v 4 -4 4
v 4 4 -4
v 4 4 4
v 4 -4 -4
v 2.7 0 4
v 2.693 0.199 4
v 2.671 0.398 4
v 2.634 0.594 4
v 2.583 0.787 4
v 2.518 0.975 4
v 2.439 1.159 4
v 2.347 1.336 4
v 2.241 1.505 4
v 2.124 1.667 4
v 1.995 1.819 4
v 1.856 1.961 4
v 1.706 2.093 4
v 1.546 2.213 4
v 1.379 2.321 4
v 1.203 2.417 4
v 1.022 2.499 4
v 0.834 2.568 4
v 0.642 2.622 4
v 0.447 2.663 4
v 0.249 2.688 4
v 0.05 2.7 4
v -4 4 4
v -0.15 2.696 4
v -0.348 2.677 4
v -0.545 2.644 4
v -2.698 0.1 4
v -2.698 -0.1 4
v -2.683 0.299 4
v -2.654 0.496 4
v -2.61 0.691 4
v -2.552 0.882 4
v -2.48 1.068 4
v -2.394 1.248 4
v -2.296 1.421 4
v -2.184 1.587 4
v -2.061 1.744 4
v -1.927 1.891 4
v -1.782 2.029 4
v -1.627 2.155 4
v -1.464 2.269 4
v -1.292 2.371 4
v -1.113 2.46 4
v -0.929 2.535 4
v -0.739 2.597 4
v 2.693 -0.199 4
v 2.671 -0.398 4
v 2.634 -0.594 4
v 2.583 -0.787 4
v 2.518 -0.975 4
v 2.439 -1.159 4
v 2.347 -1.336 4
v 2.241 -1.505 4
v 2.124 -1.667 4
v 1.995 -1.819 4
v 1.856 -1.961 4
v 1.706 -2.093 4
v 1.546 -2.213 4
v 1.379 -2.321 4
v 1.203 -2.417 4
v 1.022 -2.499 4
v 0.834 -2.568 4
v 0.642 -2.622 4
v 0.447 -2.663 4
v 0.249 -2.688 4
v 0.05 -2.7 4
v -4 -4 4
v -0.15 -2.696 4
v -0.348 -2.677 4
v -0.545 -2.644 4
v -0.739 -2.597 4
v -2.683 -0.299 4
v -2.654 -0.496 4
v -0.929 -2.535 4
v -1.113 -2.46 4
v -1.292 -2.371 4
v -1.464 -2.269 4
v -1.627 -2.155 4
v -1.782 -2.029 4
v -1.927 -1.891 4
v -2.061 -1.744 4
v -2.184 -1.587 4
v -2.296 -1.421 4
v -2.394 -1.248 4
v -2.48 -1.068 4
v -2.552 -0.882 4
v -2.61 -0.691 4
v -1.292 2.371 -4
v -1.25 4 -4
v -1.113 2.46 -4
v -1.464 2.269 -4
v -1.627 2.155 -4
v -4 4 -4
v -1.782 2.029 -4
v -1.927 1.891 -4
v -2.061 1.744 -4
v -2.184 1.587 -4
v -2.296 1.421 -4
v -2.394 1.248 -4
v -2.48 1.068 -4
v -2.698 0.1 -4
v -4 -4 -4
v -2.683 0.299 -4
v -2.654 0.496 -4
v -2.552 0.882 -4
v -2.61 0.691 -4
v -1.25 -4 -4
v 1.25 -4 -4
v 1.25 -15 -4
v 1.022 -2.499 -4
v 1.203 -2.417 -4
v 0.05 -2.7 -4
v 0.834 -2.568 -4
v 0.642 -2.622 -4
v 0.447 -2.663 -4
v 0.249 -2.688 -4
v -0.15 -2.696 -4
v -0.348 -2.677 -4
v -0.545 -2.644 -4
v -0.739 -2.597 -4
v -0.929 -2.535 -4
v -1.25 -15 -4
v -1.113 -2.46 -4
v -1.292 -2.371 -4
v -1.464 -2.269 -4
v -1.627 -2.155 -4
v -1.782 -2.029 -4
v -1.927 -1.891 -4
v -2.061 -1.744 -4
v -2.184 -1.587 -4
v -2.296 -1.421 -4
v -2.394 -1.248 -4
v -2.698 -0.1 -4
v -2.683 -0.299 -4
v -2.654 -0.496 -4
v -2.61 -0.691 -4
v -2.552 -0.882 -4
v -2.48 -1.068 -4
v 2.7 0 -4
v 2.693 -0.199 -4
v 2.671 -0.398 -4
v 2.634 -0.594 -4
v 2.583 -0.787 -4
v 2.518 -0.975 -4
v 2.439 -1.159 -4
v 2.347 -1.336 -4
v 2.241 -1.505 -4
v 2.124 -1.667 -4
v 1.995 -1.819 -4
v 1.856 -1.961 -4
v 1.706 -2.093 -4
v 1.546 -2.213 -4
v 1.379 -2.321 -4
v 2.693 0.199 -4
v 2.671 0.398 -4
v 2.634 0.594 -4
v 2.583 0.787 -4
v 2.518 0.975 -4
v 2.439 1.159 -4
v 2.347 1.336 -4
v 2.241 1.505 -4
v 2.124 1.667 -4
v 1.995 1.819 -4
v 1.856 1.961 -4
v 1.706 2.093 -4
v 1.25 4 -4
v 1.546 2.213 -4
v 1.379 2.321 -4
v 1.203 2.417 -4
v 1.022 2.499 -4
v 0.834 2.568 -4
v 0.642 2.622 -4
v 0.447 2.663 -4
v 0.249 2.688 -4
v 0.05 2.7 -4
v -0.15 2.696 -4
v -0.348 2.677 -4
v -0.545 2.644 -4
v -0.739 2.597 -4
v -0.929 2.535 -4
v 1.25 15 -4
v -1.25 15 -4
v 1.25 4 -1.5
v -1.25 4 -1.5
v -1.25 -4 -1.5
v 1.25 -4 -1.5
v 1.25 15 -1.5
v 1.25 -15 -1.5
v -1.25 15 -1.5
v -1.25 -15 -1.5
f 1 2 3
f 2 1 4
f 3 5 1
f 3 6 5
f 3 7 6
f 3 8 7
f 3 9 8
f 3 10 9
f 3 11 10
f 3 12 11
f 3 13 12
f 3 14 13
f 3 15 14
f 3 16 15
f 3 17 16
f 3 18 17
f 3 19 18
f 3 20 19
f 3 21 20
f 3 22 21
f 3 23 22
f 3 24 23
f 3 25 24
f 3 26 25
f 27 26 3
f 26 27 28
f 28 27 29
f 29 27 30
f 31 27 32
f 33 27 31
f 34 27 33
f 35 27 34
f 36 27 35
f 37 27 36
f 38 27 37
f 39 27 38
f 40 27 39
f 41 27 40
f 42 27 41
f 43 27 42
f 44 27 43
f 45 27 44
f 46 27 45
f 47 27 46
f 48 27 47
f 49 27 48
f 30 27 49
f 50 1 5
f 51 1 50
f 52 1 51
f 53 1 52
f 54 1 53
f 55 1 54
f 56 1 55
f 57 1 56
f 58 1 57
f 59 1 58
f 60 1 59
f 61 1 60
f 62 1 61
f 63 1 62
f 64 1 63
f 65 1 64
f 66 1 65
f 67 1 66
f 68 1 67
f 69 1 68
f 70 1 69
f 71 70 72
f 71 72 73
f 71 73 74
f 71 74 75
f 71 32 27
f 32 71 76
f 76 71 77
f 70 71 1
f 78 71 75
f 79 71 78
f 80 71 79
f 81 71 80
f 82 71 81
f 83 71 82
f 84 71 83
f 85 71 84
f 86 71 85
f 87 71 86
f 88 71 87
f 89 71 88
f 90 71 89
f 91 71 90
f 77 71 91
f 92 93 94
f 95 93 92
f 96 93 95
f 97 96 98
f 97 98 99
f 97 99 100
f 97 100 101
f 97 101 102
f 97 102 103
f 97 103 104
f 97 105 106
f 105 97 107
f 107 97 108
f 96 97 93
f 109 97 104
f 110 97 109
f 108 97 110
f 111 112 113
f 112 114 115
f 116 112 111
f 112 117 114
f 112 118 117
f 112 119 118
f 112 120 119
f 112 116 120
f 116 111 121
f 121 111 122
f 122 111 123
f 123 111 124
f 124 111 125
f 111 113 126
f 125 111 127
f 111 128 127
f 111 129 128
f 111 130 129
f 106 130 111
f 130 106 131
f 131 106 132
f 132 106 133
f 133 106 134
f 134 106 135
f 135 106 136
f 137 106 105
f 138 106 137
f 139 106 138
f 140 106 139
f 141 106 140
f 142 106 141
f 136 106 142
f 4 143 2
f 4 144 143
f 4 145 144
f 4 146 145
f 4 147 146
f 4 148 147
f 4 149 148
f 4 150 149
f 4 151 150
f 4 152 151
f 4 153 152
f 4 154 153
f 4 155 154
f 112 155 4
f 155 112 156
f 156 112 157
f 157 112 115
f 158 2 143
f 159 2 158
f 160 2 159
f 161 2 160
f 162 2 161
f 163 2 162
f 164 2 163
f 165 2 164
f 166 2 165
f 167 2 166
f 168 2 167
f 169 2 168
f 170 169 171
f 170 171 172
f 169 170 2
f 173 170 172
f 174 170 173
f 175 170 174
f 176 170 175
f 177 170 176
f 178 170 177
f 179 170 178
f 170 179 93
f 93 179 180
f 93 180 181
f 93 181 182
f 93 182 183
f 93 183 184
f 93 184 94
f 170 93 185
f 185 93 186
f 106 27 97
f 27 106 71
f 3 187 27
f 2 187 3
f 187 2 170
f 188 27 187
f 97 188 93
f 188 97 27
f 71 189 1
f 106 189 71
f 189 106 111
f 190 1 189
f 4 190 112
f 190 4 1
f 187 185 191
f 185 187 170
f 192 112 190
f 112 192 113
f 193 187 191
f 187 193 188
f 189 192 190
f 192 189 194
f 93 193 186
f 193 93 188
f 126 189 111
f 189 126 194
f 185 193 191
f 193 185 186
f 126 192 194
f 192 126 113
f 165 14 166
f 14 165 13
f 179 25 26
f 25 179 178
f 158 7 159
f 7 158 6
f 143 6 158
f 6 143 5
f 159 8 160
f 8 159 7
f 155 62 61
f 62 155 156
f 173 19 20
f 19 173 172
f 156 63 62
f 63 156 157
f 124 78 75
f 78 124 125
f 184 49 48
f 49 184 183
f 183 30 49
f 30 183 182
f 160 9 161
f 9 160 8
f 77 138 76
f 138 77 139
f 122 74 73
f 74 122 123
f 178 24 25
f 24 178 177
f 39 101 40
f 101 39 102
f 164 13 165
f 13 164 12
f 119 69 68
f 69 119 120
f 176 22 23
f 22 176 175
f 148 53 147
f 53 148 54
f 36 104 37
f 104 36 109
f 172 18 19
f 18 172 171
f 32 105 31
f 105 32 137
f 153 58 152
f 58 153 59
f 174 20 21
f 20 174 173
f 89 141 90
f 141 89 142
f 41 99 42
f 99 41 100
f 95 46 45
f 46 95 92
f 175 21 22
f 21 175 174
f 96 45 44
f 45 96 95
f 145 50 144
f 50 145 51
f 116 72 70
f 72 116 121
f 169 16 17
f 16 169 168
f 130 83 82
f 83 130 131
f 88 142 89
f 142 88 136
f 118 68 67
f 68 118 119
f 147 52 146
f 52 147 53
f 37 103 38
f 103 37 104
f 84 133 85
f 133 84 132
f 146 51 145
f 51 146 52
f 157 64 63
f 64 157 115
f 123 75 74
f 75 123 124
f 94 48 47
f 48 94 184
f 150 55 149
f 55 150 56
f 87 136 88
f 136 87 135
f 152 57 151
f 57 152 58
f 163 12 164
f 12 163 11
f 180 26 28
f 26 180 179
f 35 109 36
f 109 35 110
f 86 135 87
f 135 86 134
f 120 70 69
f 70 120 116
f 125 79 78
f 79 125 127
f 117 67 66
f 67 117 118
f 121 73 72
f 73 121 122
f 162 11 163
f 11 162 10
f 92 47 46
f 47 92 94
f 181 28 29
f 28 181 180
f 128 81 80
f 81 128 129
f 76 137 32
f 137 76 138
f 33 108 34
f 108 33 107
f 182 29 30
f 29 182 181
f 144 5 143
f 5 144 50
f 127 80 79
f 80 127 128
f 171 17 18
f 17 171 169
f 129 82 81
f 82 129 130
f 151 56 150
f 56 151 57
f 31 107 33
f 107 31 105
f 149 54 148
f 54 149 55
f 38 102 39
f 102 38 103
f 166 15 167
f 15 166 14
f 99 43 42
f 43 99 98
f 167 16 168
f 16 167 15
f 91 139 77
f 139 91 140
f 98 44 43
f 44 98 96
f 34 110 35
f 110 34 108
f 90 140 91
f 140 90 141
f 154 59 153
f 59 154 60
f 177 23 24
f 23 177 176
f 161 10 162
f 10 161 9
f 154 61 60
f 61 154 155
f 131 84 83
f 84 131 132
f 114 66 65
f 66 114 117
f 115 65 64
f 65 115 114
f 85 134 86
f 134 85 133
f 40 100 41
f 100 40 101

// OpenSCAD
/*

Removable spring hanger to be used with the translation stage (mount_holder.scad) to make it easier to install the springs
Fits into the groove on the mount_holder.scad

*/

$fs =0.2;
$fa = 0.2;

block_height = 8;
block_width = 8;
block_length = 8;

bar_length = 30;
bar_width = 2.5;
bar_height = 2.5;

bushing_d = 5.4;

difference(){
    union(){
        cube([block_width,block_length,block_height],center=true);
        translate([0,0,-block_height/2+bar_height/2]) cube([bar_width,bar_length,bar_height],center=true);
    }
    cylinder(d = bushing_d, h = block_height+2, center=true);
}
